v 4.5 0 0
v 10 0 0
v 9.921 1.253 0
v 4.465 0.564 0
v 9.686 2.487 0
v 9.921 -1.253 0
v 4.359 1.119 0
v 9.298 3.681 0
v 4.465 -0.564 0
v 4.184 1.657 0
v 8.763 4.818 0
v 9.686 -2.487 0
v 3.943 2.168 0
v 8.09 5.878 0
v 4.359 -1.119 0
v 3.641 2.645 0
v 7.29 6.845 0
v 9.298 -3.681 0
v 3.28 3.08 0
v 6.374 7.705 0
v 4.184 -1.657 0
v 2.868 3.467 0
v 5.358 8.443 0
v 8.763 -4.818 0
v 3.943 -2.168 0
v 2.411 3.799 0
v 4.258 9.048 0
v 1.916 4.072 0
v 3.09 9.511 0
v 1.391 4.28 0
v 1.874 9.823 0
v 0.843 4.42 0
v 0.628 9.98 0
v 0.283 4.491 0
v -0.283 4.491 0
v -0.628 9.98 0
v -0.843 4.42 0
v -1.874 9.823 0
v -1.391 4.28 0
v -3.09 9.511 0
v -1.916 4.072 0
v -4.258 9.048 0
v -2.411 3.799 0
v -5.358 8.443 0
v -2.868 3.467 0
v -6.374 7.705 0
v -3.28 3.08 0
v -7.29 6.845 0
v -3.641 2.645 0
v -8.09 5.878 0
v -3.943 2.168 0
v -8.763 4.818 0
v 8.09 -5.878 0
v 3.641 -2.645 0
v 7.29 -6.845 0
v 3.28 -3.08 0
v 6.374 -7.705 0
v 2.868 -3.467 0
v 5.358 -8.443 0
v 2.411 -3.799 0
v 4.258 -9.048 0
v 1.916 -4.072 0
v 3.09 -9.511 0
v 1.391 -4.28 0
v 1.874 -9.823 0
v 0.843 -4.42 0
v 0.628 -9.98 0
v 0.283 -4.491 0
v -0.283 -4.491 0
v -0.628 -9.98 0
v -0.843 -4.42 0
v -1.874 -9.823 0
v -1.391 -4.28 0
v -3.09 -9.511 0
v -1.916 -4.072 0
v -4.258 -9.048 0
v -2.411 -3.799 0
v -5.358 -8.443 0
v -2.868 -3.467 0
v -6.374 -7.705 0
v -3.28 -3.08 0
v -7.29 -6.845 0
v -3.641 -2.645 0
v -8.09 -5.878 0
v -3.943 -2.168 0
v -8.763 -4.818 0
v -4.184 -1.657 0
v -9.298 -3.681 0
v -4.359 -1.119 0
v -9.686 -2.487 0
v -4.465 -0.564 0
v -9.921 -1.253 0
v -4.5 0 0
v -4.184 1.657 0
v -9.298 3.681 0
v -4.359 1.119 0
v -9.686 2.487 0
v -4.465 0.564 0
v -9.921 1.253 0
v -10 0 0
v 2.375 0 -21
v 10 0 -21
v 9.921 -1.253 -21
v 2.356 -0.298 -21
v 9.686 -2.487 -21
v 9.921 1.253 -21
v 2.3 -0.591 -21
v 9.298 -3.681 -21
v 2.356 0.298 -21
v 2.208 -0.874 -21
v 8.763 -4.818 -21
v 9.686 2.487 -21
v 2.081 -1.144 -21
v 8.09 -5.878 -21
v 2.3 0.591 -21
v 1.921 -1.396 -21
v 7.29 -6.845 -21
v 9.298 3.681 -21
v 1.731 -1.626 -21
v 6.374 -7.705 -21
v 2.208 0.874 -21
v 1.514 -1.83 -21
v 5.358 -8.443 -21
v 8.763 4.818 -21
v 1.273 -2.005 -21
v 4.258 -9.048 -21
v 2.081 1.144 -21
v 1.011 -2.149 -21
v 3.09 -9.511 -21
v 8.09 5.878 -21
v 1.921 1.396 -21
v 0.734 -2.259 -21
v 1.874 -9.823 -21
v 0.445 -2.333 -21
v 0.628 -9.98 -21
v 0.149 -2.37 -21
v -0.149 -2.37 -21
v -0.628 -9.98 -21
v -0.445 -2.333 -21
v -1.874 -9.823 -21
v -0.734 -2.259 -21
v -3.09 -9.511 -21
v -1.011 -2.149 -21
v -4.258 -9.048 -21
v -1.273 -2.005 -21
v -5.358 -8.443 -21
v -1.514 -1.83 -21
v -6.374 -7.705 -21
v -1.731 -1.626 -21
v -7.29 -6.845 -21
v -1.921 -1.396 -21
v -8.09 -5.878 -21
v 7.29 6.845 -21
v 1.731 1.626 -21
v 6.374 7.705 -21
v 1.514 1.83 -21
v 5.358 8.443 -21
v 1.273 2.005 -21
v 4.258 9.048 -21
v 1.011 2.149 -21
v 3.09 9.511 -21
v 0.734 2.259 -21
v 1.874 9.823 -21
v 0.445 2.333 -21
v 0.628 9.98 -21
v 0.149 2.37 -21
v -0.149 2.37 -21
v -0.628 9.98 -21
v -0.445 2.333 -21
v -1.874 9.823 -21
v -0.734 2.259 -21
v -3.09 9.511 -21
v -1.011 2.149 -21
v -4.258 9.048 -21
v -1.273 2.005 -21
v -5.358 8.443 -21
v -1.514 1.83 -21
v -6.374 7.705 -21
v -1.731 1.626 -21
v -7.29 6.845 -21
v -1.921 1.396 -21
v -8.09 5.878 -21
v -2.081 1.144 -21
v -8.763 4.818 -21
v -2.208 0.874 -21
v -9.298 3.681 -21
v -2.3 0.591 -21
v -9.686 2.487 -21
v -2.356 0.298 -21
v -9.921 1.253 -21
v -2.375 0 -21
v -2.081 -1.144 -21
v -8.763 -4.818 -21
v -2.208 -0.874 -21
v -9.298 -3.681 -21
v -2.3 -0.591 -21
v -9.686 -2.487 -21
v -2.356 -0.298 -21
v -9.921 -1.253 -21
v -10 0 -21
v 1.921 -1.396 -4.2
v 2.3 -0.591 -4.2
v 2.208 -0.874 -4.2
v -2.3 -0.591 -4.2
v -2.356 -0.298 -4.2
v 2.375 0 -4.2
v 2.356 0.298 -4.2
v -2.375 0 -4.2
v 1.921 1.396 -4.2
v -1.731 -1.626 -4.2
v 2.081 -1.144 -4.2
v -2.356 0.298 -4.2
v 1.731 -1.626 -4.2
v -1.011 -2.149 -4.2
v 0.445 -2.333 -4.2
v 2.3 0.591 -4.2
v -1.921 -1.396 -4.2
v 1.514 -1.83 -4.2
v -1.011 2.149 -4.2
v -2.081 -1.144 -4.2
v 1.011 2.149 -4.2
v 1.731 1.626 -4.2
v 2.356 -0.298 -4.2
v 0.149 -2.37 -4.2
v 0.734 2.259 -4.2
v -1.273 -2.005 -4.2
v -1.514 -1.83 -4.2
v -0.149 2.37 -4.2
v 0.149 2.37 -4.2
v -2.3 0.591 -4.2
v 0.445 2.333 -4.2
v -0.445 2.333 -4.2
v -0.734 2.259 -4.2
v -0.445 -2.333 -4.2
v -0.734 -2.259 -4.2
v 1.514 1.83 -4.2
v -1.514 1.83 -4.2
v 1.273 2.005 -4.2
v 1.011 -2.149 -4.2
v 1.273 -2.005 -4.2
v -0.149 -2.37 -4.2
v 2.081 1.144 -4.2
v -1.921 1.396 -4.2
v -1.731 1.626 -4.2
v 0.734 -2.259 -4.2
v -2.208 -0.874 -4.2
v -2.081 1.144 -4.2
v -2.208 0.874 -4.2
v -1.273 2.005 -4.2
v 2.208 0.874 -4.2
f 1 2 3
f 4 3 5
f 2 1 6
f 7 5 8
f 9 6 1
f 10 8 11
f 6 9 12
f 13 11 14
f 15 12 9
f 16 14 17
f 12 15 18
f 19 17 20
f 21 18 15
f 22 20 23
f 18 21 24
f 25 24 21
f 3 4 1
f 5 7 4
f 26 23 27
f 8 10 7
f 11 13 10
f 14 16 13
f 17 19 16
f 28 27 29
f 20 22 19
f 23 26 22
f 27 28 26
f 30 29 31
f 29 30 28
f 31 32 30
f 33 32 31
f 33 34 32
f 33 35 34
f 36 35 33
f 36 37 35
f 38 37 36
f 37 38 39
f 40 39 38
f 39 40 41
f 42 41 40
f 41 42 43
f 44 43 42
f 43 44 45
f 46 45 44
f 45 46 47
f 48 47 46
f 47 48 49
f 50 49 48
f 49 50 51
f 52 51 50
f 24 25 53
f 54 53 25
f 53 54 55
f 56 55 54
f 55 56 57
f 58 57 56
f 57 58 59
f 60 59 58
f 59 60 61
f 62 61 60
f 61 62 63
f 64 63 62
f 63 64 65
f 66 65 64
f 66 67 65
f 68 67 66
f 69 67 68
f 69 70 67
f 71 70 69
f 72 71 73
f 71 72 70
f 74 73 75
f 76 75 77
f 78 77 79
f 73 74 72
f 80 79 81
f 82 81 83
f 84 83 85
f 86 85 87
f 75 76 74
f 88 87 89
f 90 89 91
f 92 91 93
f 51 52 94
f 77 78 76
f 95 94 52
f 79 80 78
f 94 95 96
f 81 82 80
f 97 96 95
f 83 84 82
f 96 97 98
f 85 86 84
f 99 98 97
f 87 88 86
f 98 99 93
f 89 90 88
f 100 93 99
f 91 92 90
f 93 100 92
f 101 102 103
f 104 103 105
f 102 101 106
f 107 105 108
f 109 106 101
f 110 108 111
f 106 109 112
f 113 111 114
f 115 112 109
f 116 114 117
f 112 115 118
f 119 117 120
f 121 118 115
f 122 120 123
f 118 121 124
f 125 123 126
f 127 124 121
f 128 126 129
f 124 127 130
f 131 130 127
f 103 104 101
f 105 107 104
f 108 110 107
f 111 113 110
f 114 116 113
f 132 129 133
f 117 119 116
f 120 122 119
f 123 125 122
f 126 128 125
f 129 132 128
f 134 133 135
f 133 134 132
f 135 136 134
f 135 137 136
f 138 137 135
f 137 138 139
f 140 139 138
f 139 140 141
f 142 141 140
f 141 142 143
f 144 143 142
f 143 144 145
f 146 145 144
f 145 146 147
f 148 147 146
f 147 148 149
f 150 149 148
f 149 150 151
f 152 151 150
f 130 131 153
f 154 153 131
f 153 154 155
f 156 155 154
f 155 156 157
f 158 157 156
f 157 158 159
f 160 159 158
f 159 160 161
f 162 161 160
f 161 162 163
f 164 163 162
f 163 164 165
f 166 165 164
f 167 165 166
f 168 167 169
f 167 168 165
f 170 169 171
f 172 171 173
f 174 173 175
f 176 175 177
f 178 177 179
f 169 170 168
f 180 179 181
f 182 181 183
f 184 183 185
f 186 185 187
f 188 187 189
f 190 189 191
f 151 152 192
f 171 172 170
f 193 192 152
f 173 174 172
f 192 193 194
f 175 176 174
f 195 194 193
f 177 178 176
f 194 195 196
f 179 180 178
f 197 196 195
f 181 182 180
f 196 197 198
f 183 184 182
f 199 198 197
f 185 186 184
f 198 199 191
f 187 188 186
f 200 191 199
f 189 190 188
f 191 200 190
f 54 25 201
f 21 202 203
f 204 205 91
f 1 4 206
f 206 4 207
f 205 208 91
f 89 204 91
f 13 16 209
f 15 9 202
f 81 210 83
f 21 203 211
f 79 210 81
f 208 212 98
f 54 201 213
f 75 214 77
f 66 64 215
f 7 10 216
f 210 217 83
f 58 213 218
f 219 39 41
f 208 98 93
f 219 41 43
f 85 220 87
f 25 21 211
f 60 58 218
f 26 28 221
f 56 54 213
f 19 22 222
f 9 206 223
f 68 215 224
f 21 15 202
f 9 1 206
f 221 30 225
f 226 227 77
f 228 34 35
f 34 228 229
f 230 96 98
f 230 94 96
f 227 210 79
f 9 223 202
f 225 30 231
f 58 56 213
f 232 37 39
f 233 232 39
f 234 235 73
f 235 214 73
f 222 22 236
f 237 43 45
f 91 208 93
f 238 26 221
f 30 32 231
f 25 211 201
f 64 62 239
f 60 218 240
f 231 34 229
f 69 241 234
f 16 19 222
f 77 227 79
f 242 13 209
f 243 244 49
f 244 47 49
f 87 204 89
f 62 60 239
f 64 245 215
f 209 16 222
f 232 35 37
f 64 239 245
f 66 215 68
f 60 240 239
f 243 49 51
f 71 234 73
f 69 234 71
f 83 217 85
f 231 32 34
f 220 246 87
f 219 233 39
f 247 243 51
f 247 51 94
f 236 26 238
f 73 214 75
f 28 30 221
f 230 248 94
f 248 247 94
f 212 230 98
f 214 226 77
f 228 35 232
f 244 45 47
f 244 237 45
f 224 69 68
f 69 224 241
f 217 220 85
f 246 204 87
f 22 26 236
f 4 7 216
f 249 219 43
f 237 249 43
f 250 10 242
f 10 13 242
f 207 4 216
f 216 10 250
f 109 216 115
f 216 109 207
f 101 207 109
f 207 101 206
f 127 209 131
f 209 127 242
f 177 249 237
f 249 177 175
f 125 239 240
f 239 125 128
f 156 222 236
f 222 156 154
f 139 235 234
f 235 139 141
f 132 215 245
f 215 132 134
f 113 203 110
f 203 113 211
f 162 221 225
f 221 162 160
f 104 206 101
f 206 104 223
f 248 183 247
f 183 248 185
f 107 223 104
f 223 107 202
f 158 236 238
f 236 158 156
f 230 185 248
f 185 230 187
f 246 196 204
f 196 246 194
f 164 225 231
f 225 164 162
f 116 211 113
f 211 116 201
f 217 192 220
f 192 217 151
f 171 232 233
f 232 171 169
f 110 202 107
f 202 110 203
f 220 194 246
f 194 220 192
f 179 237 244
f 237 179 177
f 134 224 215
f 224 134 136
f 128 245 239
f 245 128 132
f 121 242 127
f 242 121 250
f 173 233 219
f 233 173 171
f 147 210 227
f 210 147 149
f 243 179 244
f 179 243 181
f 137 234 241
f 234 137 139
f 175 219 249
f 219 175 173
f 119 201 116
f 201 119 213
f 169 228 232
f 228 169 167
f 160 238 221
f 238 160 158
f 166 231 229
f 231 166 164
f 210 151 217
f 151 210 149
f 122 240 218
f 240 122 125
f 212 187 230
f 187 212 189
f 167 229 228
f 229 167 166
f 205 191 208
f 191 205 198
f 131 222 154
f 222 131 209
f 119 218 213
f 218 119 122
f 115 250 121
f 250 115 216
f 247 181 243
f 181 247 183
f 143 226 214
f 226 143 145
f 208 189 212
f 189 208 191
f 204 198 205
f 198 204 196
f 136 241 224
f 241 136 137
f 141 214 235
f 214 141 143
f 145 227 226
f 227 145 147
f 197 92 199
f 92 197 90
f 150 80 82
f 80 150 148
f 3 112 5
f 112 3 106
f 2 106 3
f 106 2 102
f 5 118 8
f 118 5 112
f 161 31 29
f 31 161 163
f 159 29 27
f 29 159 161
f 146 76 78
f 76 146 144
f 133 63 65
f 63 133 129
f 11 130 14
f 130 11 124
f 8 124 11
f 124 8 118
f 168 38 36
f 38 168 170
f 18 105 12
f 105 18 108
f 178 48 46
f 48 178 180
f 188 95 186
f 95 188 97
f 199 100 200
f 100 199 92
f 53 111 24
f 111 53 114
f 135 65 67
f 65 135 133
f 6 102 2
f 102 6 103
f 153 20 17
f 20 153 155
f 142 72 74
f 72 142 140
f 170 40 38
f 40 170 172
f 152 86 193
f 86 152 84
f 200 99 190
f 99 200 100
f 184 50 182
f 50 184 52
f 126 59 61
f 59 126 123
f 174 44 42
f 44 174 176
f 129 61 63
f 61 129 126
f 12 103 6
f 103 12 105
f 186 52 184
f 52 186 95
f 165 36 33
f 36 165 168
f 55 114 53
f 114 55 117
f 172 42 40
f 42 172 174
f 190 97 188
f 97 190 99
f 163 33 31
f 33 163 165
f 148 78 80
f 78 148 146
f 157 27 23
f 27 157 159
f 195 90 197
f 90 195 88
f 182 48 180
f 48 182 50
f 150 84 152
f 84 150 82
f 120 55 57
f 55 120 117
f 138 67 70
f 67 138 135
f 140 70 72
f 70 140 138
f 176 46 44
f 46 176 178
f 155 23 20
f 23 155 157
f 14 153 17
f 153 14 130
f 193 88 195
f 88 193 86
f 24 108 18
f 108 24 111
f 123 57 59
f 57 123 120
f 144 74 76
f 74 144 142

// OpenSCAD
$fn = 50;


difference() {
	union() {
		translate(v = [0, 0, -21.0000000000]) {
			cylinder(h = 21, r = 10.0000000000);
		}
		cylinder(h = 0, r = 19.0000000000);
	}
	union() {
		translate(v = [0, 0, 0]) {
			rotate(a = [0, 0, 0]) {
				difference() {
					union() {
						#translate(v = [0, 0, -21.0000000000]) {
							cylinder(h = 21, r = 2.2500000000);
						}
						#translate(v = [0, 0, -4.2000000000]) {
							cylinder(h = 4.2000000000, r1 = 2.3750000000, r2 = 4.5000000000);
						}
						#translate(v = [0, 0, -21.0000000000]) {
							cylinder(h = 21, r = 2.3750000000);
						}
						#translate(v = [0, 0, -21.0000000000]) {
							cylinder(h = 21, r = 2.2500000000);
						}
					}
					union();
				}
			}
		}
	}
}
